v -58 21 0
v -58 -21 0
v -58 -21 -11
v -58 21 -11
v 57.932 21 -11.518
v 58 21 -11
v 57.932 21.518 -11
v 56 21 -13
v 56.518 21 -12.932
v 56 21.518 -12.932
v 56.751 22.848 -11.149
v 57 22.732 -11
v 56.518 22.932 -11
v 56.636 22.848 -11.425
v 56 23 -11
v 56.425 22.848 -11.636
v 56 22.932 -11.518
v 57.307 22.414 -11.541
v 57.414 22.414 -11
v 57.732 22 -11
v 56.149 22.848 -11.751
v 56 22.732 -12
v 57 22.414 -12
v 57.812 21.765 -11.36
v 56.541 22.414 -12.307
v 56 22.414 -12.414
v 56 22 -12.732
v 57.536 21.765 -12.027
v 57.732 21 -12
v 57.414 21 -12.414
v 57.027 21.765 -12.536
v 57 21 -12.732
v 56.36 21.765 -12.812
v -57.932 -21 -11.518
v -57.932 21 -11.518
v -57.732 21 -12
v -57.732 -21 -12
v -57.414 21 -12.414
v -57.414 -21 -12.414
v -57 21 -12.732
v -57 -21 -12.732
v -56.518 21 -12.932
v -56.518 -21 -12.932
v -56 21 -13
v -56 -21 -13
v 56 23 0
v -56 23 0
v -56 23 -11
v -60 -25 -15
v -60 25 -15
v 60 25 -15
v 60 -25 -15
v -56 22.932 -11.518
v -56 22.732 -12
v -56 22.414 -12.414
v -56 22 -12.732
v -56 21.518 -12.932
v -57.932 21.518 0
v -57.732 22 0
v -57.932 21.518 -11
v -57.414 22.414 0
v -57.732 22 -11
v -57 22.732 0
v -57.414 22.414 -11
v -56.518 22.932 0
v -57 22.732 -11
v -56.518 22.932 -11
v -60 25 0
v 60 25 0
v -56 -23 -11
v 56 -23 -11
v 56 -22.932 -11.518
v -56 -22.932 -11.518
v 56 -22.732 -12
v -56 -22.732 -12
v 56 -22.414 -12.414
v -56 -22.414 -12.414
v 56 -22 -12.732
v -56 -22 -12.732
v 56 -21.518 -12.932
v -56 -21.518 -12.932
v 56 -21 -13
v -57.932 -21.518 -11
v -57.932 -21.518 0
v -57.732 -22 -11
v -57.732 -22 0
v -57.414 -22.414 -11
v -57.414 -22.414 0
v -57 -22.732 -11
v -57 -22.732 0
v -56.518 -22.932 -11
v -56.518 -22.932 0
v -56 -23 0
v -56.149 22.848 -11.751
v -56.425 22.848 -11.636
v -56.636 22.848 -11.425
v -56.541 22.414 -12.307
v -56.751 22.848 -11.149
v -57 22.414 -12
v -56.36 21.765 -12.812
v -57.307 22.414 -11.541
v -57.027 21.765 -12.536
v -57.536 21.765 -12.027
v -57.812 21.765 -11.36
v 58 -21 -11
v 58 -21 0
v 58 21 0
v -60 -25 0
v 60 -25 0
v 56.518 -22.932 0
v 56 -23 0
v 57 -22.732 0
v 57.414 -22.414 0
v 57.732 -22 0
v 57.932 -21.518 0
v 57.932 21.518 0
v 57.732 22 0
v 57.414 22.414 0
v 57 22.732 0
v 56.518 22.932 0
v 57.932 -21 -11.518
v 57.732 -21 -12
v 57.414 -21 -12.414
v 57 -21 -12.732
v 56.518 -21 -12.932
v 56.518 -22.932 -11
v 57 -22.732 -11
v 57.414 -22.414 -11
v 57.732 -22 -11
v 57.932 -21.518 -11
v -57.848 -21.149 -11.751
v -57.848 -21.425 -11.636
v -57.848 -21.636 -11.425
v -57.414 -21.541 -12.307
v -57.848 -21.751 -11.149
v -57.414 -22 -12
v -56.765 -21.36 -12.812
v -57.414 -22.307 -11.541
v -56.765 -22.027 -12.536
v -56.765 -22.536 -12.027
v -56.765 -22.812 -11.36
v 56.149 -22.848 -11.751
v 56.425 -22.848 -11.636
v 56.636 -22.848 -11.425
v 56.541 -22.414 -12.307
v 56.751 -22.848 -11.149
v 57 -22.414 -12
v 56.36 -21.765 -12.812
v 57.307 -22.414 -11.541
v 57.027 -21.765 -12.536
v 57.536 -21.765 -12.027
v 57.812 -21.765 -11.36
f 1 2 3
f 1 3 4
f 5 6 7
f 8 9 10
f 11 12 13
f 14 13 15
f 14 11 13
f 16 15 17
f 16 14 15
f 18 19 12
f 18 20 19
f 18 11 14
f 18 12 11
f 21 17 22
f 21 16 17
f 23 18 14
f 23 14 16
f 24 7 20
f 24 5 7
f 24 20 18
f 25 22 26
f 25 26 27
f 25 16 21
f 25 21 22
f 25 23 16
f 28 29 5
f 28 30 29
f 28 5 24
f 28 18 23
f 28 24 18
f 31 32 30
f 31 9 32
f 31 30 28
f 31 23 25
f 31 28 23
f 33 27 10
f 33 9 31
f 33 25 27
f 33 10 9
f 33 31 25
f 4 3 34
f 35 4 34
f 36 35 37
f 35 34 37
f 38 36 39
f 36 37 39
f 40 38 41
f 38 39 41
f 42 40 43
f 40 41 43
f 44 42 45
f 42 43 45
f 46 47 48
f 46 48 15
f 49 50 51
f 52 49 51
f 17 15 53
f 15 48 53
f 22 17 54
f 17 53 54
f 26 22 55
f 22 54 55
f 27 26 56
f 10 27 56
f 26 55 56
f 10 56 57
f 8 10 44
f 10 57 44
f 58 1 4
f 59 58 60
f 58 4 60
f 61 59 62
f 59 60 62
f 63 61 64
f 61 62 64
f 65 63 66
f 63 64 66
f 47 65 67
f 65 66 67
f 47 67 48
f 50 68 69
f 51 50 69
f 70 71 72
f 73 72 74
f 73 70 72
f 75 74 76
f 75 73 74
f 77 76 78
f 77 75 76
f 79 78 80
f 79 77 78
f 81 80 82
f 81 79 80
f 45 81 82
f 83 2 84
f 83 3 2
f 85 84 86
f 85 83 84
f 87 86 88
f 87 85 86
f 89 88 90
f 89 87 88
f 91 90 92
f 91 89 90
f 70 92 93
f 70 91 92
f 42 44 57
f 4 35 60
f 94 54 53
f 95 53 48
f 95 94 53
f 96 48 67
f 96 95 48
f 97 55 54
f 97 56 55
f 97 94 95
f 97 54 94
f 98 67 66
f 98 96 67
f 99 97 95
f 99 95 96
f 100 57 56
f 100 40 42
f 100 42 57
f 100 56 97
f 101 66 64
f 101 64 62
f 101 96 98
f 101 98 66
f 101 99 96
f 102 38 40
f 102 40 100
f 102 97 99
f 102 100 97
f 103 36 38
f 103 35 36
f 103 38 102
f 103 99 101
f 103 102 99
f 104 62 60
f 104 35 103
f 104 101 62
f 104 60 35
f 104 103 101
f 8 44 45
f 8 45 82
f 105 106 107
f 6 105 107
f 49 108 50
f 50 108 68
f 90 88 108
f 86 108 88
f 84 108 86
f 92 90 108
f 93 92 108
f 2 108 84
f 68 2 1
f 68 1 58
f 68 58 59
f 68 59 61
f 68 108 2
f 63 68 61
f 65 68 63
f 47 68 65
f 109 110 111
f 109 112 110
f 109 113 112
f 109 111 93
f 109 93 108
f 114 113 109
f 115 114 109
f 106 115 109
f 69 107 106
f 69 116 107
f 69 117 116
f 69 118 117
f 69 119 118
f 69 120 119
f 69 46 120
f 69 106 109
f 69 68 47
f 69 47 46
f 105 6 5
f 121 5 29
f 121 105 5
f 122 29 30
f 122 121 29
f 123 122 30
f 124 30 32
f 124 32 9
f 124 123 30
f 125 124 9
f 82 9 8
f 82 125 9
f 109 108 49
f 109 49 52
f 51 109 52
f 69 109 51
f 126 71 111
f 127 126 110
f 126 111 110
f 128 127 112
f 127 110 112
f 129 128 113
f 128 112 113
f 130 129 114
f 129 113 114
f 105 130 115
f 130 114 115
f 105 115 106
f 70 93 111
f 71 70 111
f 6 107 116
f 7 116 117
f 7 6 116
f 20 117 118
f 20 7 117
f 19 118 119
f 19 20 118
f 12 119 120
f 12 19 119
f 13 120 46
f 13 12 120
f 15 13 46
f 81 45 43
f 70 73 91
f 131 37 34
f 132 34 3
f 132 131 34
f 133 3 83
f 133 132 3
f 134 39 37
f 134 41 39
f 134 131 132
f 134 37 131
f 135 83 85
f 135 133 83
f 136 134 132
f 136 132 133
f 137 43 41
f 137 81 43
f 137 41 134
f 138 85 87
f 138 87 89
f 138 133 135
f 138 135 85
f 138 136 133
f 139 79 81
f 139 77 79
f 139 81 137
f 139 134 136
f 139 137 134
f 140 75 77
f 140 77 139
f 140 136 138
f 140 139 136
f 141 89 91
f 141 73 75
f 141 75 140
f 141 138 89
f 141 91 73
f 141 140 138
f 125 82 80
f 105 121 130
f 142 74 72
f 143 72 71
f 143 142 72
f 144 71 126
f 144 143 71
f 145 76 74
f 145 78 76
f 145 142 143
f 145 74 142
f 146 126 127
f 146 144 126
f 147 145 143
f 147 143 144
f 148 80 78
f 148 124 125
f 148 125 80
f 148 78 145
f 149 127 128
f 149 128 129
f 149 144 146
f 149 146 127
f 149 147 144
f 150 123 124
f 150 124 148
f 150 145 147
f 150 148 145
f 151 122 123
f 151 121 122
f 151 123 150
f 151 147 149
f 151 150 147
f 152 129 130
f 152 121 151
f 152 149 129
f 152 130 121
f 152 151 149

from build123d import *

# Parameters (mm, degrees)
SKETCH1_W           = 120
SKETCH1_H           = 50
BOSS_EXTRUDE1_DEPTH = 15
SHELL1_T            = -2
FILLET1_R           = 2


with BuildPart() as part:
    # Sketch1 → Boss-Extrude1 (new body)
    with BuildSketch(Plane.XY):
        Rectangle(SKETCH1_W, SKETCH1_H)
    extrude(amount=-BOSS_EXTRUDE1_DEPTH)

    # Shell1
    shell1_openings = [part.faces().sort_by_distance(p)[0] for p in [
        (0, 0, 0),
    ]]
    offset(amount=SHELL1_T, openings=shell1_openings, kind=Kind.INTERSECTION)

    # Fillet1
    fillet1_edges = [part.edges().sort_by_distance(p)[0] for p in [
        (58, 0, -13),
        (58, 23, -6.5),
        (0, -23, -13),
        (58, -23, -6.5),
        (-58, 0, -13),
        (-58, -23, -6.5),
        (0, 23, -13),
        (-58, 23, -6.5),
    ]]
    fillet(fillet1_edges, radius=FILLET1_R)


solid = part.part
